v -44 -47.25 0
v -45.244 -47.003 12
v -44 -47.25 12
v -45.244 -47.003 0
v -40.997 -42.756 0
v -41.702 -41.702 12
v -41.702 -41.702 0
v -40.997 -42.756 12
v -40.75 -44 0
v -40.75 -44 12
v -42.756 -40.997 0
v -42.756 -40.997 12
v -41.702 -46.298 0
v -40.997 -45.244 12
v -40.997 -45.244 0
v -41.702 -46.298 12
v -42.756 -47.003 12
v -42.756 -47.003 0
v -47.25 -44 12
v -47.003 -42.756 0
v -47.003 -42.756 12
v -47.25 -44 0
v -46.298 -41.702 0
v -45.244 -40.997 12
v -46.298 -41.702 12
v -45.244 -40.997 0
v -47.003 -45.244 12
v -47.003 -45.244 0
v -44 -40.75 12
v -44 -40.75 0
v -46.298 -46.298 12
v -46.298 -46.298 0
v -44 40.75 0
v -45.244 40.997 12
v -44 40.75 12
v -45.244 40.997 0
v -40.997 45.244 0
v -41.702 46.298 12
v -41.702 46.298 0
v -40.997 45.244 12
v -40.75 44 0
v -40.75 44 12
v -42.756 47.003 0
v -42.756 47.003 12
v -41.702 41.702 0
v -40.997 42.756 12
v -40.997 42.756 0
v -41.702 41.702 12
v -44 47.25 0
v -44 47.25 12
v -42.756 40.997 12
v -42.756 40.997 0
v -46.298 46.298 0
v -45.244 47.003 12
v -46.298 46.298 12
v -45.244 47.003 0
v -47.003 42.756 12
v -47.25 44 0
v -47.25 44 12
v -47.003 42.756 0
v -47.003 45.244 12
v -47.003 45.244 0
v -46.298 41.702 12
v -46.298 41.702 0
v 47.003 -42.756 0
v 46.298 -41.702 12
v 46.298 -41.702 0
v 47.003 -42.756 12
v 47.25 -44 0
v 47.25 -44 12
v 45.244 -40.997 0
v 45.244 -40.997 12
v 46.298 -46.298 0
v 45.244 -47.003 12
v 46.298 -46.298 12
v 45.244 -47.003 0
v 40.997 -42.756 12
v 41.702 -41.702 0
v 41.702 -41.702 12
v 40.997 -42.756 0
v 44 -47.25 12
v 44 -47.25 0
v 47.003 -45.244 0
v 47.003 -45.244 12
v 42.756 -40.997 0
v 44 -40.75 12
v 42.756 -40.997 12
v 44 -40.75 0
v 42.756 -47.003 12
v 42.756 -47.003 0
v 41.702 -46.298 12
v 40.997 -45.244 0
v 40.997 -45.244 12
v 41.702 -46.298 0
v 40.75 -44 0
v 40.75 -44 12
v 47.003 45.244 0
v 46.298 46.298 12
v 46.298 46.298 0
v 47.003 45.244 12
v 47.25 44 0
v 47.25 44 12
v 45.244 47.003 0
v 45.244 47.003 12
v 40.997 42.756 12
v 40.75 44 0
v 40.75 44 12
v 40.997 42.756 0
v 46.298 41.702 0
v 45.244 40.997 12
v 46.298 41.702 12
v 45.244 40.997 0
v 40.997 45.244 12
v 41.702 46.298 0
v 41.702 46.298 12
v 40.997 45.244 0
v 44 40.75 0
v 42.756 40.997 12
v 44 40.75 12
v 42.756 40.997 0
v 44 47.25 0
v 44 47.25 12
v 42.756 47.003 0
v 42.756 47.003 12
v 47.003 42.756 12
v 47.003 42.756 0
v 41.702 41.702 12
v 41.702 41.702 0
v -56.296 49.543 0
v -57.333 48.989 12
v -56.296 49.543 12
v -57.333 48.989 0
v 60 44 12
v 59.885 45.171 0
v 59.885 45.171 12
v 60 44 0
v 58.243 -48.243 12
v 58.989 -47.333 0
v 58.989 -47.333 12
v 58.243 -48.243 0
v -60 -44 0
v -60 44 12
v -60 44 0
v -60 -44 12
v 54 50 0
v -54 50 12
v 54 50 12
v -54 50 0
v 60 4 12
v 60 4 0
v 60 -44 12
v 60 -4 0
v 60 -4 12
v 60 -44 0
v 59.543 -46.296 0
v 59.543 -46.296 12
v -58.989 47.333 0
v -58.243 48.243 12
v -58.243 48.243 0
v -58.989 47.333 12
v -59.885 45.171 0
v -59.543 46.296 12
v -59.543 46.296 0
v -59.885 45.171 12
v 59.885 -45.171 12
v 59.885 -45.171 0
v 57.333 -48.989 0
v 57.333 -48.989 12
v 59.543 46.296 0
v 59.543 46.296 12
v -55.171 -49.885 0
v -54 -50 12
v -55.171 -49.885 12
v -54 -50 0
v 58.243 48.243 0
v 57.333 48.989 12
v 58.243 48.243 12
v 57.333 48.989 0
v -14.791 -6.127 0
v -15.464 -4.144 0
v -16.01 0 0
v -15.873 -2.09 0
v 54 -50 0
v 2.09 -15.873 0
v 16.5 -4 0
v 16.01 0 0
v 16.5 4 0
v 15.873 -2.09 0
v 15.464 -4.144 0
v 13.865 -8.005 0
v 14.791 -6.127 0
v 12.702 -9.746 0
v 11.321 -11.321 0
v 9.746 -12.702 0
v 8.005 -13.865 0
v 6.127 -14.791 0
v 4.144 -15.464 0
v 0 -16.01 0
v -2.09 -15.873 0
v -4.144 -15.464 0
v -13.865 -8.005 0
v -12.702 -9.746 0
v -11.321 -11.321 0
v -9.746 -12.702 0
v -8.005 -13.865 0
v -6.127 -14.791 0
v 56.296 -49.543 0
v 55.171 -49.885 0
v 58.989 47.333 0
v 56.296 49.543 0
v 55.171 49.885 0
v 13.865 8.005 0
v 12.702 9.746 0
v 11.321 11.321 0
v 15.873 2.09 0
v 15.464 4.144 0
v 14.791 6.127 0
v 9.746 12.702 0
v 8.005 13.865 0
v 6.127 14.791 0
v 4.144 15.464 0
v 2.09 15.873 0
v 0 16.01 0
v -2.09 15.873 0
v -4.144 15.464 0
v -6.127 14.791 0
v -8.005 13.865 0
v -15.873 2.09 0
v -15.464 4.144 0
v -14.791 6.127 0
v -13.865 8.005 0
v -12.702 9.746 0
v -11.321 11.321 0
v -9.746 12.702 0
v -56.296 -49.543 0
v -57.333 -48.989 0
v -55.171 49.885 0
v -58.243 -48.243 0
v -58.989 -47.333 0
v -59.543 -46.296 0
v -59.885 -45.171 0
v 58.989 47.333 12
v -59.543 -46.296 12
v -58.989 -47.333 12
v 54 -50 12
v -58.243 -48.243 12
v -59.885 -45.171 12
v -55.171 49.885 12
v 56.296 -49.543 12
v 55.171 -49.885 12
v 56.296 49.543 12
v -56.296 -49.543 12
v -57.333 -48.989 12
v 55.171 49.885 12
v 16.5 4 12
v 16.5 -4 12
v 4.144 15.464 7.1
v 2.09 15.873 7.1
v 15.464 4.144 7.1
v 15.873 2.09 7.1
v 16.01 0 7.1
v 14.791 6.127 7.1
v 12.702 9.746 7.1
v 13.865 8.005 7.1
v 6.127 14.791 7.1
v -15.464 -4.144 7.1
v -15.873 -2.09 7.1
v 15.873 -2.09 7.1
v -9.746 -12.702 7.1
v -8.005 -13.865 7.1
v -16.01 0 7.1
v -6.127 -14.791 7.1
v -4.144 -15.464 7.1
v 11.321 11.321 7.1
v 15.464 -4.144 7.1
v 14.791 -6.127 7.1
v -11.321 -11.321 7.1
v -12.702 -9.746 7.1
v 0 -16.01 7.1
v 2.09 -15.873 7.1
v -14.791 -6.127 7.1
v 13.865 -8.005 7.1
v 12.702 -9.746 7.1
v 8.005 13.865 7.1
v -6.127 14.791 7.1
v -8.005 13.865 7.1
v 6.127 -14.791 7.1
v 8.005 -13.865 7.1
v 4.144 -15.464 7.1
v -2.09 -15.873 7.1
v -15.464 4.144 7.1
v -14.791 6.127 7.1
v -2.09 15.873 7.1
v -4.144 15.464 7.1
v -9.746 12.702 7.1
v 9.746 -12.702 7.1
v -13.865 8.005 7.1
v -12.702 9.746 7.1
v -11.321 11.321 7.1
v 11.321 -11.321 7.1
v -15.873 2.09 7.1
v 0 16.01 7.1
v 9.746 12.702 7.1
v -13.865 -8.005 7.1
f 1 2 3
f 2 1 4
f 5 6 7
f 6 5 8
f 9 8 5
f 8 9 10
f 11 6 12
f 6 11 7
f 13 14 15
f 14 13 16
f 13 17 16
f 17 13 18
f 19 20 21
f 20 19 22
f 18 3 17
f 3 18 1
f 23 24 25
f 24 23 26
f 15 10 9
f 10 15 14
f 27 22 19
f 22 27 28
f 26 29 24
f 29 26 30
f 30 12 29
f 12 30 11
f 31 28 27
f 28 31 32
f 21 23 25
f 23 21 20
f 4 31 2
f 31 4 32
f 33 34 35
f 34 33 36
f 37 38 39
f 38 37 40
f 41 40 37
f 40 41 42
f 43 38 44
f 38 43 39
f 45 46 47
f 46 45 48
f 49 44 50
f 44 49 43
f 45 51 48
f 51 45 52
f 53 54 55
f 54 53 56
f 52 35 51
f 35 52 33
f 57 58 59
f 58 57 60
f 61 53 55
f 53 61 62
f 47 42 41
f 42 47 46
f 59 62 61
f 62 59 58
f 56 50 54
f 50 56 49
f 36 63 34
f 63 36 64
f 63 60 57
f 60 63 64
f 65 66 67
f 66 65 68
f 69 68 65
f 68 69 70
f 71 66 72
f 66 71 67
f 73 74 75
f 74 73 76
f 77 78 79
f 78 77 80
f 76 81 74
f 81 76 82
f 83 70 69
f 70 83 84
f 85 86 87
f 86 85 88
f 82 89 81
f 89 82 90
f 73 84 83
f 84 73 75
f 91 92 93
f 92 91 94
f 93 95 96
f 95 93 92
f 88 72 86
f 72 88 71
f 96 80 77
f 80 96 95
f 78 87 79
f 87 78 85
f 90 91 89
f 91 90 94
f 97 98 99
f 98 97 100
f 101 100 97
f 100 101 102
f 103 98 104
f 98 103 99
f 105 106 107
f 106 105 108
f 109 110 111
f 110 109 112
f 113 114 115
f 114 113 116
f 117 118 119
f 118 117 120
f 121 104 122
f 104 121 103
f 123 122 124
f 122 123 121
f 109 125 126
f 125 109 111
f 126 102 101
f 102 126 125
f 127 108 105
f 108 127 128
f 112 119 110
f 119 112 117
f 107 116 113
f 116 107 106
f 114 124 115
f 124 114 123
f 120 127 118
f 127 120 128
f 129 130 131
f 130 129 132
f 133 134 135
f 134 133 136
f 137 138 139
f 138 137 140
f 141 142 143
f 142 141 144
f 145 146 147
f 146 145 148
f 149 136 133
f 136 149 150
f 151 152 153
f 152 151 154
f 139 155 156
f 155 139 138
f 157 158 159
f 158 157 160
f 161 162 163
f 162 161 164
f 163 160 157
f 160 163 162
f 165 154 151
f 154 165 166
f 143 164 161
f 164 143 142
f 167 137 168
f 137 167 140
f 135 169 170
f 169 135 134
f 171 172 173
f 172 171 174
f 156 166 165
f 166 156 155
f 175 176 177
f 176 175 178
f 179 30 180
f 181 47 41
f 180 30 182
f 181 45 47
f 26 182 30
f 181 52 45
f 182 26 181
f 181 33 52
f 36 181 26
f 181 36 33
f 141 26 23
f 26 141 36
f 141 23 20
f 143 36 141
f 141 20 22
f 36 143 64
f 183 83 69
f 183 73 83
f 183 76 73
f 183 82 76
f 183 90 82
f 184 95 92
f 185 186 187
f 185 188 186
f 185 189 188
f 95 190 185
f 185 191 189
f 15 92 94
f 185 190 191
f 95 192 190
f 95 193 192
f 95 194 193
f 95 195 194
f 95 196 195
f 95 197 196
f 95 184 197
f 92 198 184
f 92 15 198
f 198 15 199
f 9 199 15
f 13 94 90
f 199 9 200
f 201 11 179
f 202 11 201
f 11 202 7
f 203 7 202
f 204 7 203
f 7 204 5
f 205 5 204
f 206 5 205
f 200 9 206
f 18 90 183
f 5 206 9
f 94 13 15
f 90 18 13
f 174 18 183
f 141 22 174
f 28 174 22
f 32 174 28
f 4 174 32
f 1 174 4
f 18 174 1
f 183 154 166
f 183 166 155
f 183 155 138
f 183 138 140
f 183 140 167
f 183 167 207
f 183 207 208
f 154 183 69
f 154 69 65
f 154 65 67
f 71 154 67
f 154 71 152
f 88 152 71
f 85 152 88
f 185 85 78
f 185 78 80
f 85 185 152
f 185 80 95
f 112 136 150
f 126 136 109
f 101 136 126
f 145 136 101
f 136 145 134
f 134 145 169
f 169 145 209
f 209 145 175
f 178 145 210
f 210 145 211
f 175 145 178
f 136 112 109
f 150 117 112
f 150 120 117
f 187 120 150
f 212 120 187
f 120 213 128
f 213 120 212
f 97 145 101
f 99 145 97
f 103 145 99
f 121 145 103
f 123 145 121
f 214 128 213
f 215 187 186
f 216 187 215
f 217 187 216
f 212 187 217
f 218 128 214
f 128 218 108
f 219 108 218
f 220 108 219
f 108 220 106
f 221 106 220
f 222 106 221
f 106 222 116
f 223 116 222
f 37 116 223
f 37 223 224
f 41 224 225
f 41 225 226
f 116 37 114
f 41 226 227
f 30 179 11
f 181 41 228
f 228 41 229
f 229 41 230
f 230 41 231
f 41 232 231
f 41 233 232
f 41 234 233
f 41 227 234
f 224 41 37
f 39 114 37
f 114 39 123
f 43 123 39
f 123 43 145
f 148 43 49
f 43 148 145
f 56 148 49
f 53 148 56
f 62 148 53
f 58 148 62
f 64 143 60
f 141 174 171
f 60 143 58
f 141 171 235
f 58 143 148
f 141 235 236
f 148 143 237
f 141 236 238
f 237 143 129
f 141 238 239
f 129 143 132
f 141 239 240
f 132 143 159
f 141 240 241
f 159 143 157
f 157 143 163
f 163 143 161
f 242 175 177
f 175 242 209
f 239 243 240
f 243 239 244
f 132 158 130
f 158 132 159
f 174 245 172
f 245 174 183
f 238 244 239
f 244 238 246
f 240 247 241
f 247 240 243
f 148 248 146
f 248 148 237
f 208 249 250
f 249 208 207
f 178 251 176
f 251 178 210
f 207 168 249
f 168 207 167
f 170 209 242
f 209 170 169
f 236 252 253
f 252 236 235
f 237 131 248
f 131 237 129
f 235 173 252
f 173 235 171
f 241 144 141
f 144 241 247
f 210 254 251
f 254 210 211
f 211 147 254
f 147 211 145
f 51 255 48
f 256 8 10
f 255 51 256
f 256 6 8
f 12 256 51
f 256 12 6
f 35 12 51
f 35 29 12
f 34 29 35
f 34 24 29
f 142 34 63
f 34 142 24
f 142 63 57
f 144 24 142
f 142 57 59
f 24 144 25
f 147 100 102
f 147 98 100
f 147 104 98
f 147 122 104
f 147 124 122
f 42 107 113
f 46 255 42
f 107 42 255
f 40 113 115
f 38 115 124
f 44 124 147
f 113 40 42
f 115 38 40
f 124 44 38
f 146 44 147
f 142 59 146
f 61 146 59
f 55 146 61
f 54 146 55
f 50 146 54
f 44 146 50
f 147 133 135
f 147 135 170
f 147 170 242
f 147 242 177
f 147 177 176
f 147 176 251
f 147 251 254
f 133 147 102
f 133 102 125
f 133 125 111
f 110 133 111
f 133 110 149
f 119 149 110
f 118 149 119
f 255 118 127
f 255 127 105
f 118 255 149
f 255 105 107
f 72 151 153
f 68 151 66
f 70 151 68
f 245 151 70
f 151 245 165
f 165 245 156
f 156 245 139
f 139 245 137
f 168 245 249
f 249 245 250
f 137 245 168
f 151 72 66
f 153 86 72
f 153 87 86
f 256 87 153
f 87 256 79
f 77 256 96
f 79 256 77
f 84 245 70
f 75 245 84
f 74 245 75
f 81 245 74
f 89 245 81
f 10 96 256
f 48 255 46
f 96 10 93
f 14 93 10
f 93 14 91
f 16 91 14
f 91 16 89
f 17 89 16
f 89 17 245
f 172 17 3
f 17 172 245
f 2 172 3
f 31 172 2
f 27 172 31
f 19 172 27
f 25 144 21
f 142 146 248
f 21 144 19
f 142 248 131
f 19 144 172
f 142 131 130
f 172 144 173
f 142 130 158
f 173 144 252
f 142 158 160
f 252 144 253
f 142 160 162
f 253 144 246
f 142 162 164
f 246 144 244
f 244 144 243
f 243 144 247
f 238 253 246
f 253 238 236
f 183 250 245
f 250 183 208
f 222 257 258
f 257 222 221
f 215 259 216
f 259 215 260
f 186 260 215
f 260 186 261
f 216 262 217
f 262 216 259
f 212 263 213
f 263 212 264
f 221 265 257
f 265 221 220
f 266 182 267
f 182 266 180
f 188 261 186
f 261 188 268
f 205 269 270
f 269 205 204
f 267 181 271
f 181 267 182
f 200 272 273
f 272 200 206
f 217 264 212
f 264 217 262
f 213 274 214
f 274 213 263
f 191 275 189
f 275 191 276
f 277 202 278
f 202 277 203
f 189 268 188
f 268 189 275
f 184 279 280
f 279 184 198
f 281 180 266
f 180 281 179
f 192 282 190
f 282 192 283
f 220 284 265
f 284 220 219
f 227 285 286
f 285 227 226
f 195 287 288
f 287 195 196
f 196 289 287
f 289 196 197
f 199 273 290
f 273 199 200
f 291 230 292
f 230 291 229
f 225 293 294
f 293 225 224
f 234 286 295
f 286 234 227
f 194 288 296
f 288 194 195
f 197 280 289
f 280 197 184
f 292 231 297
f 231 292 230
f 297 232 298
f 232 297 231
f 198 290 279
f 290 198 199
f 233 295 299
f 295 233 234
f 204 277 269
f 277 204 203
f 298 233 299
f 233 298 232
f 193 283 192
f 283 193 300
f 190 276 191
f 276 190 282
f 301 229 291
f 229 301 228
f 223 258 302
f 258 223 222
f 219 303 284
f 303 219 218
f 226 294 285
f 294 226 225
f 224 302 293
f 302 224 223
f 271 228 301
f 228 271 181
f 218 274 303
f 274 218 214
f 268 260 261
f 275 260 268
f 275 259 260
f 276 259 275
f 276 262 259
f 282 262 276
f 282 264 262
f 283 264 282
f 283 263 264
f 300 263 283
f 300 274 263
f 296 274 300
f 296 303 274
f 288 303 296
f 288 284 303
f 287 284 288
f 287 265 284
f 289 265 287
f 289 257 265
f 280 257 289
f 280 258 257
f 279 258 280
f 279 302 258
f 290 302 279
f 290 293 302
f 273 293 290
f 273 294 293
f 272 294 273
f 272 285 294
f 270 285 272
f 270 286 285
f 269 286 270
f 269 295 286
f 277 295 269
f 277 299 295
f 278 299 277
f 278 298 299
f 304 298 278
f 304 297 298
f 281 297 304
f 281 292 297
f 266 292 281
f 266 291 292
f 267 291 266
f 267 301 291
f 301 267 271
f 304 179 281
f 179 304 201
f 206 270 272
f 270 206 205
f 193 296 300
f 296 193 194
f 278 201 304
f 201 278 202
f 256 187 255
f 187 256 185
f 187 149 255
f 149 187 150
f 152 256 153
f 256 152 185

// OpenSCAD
// ===========================================================================
// HULL-FRAME COORDINATE STANDARD - Rev R1 (2026-06-11).  See CLAUDE.md.
//   Hull frame (canonical for ALL design artifacts): X = +port (left),
//   Y = +aft (back), Z = +dorsal (up); origin = SerenityAssembly.FCStd
//   world origin.  Primary-component STLs published to airframe/stls/
//   are stored directly in hull frame, baked by tools/bake_hull_frame.py
//   (marker 'SerenityUAV HULL-FRAME R1' in the binary STL header).
//   NEVER re-bake a mesh derived from an already-baked file.
//   This file:
//     Skipper ground-support equipment - part-local print frame.  The
//     aircraft hull-frame standard does not apply to GCS hardware
//     (documented exception, like the avionics KiCad files).
// ===========================================================================
/*
 * skipper_gimbal_pan.scad
 * Pan (azimuth) stage for Skipper GCS directional antenna gimbal
 *
 * Author:  Steve Griffing, PE(CSE), CISSP-ISSEP, CPP
 * License: CERN-OHL-W-2.0 — see LICENSES/CERN-OHL-W 2.0 (SPDX-License-Identifier: CERN-OHL-W-2.0)
 * Revision: R (2026-06-11)
 *
 * Description:
 *   The pan stage rotates the tilt stage + antenna assembly about the vertical
 *   (Z) axis.  It consists of:
 *     - Base plate that mounts to the tripod or mast (M6 bolt pattern)
 *     - 6804 (20×32×7 mm) thin-section bearing pressed into base
 *     - Rotating turret that carries the tilt stage
 *     - DS3218MG servo mounted in the base, driving the turret via a printed
 *       sector gear attached to the turret underside
 *     - AS5600 magnetic encoder PCB pocket on the underside of the turret
 *       (reads the diametrically magnetised disc pressed onto the bearing shaft)
 *     - Travel limits: 0°–355° continuous (5° hard stop gap for wiring relief)
 *
 * Material: CF-PETG, 0.15 mm layers, 40% infill, 4 perimeters
 *
 * Mesh verification: run after every geometry change.
 *   openscad -o skipper_gimbal_pan.stl skipper_gimbal_pan.scad
 *   python3 tools/validate_stls.py
 */

/* ---------------------------------------------------------------------------
 * Render mode: 0 = base plate, 1 = rotating turret, 2 = exploded assembly
 * ---------------------------------------------------------------------------*/
RENDER_MODE = 0;

/* ---------------------------------------------------------------------------
 * Bearing (6804 thin-section: 20 mm ID, 32 mm OD, 7 mm width)
 * ---------------------------------------------------------------------------*/
BRG_ID   = 20.0;   /* Inner race bore mm                                  */
BRG_OD   = 32.0;   /* Outer race diameter mm                              */
BRG_W    = 7.0;    /* Bearing width mm                                    */
BRG_PRESS_TOL = 0.02; /* Press-fit interference on housing bore (+ = tighter) */

/* ---------------------------------------------------------------------------
 * Base plate geometry
 * ---------------------------------------------------------------------------*/
BASE_W   = 120.0;  /* Base plate width mm                                  */
BASE_D   = 100.0;  /* Base plate depth mm                                  */
BASE_H   = 12.0;   /* Base plate thickness mm (including bearing housing)  */
BASE_R   = 6.0;    /* Corner radius mm                                     */
MOUNT_HOLE_D = 6.5;/* M6 tripod mount hole diameter mm                    */
MOUNT_PITCH  = 88.0;/* M6 mounting hole pitch (centre-to-centre) mm       */

/* ---------------------------------------------------------------------------
 * Servo pocket (DS3218MG: 40×20×38 mm body; shaft centre at 20×10 mm from
 * mounting face)
 * ---------------------------------------------------------------------------*/
SERVO_W      = 42.0;   /* Pocket width mm (2 mm clearance each side)      */
SERVO_D      = 22.0;   /* Pocket depth mm                                  */
SERVO_H      = 40.0;   /* Pocket depth below base top face mm              */
SERVO_OFFSET_X = 30.0; /* Servo shaft centre offset from bearing centre X mm */

/* ---------------------------------------------------------------------------
 * Sector gear on turret (M=1.0, R=28 mm, 120° arc driven by servo arm pinion)
 * ---------------------------------------------------------------------------*/
SECTOR_R    = 28.0; /* Pitch radius mm                                     */
SECTOR_ARC  = 120;  /* Sweep angle deg — servo ±60° gives 120° pan range  */
SECTOR_W    = 8.0;  /* Gear face width mm                                  */

/* ---------------------------------------------------------------------------
 * Turret geometry
 * ---------------------------------------------------------------------------*/
TURRET_OD   = 80.0; /* Turret outer diameter mm                            */
TURRET_H    = 15.0; /* Turret body height mm                               */
TILT_MOUNT_W = 60.0;/* Width of tilt stage mounting boss on turret top mm  */
TILT_MOUNT_D = 40.0;/* Depth of tilt stage mounting boss mm                */
TILT_MOUNT_H = 6.0; /* Boss protrusion height mm                           */

/* ===========================================================================
 * Modules
 * ===========================================================================*/

module base_plate() {
    /*
     * Base plate with:
     *   - Central bearing housing (outer race press-fit bore)
     *   - Servo pocket
     *   - M6 tripod mounting holes at four corners
     *   - M3 mounting holes for AS5600 encoder PCB on underside
     */
    difference() {
        /* Exterior solid */
        hull() {
            for (xi = [-1, 1]) {
                for (yi = [-1, 1]) {
                    translate([xi * (BASE_W / 2 - BASE_R), yi * (BASE_D / 2 - BASE_R), 0]) {
                        cylinder(r = BASE_R, h = BASE_H, $fn = 32);
                    }
                }
            }
        }

        /* Central bearing housing bore (outer race press-fit) */
        translate([0, 0, -0.1]) {
            cylinder(d = BRG_OD + BRG_PRESS_TOL, h = BRG_W + 0.2, $fn = 48);
        }

        /* Servo pocket */
        translate([SERVO_OFFSET_X, 0, BASE_H - SERVO_H]) {
            cube([SERVO_W, SERVO_D, SERVO_H + 0.1], center = true);
        }

        /* M6 tripod mount holes */
        for (xi = [-1, 1]) {
            for (yi = [-1, 1]) {
                translate([xi * MOUNT_PITCH / 2, yi * MOUNT_PITCH / 2, -0.1]) {
                    cylinder(d = MOUNT_HOLE_D, h = BASE_H + 0.2, $fn = 16);
                }
            }
        }

        /* Wire relief slot from servo pocket to exterior */
        translate([SERVO_OFFSET_X + SERVO_W / 2, 0, BASE_H / 2]) {
            cube([BASE_W - SERVO_OFFSET_X - SERVO_W / 2, 8, BASE_H + 0.2], center = true);
        }
    }
}

module turret() {
    /*
     * Rotating turret: mounts to bearing inner race, carries tilt stage boss
     * on top face, and has sector gear on underside for pan drive.
     */
    difference() {
        union() {
            /* Main disc */
            cylinder(d = TURRET_OD, h = TURRET_H, $fn = 64);

            /* Tilt stage mounting boss on top */
            translate([0, 0, TURRET_H]) {
                cube([TILT_MOUNT_W, TILT_MOUNT_D, TILT_MOUNT_H], center = true);
            }
        }

        /* Bearing inner race bore — slip fit onto shaft */
        translate([0, 0, -0.1]) {
            cylinder(d = BRG_ID + 0.1, h = BRG_W + TURRET_H + 0.2, $fn = 32);
        }

        /* M3 holes for tilt stage attachment — 4× at tilt mount boss corners */
        for (xi = [-1, 1]) {
            for (yi = [-1, 1]) {
                translate([xi * (TILT_MOUNT_W / 2 - 5), yi * (TILT_MOUNT_D / 2 - 5),
                           TURRET_H - 0.1]) {
                    cylinder(d = 3.2, h = TILT_MOUNT_H + 0.2, $fn = 12);
                }
            }
        }
    }
}

/* ===========================================================================
 * Render dispatch
 * ===========================================================================*/
if (RENDER_MODE == 0) {
    base_plate();
} else if (RENDER_MODE == 1) {
    turret();
} else {
    /* Exploded view: base at origin, turret above */
    base_plate();
    translate([0, 0, BASE_H + 20]) {
        turret();
    }
}
